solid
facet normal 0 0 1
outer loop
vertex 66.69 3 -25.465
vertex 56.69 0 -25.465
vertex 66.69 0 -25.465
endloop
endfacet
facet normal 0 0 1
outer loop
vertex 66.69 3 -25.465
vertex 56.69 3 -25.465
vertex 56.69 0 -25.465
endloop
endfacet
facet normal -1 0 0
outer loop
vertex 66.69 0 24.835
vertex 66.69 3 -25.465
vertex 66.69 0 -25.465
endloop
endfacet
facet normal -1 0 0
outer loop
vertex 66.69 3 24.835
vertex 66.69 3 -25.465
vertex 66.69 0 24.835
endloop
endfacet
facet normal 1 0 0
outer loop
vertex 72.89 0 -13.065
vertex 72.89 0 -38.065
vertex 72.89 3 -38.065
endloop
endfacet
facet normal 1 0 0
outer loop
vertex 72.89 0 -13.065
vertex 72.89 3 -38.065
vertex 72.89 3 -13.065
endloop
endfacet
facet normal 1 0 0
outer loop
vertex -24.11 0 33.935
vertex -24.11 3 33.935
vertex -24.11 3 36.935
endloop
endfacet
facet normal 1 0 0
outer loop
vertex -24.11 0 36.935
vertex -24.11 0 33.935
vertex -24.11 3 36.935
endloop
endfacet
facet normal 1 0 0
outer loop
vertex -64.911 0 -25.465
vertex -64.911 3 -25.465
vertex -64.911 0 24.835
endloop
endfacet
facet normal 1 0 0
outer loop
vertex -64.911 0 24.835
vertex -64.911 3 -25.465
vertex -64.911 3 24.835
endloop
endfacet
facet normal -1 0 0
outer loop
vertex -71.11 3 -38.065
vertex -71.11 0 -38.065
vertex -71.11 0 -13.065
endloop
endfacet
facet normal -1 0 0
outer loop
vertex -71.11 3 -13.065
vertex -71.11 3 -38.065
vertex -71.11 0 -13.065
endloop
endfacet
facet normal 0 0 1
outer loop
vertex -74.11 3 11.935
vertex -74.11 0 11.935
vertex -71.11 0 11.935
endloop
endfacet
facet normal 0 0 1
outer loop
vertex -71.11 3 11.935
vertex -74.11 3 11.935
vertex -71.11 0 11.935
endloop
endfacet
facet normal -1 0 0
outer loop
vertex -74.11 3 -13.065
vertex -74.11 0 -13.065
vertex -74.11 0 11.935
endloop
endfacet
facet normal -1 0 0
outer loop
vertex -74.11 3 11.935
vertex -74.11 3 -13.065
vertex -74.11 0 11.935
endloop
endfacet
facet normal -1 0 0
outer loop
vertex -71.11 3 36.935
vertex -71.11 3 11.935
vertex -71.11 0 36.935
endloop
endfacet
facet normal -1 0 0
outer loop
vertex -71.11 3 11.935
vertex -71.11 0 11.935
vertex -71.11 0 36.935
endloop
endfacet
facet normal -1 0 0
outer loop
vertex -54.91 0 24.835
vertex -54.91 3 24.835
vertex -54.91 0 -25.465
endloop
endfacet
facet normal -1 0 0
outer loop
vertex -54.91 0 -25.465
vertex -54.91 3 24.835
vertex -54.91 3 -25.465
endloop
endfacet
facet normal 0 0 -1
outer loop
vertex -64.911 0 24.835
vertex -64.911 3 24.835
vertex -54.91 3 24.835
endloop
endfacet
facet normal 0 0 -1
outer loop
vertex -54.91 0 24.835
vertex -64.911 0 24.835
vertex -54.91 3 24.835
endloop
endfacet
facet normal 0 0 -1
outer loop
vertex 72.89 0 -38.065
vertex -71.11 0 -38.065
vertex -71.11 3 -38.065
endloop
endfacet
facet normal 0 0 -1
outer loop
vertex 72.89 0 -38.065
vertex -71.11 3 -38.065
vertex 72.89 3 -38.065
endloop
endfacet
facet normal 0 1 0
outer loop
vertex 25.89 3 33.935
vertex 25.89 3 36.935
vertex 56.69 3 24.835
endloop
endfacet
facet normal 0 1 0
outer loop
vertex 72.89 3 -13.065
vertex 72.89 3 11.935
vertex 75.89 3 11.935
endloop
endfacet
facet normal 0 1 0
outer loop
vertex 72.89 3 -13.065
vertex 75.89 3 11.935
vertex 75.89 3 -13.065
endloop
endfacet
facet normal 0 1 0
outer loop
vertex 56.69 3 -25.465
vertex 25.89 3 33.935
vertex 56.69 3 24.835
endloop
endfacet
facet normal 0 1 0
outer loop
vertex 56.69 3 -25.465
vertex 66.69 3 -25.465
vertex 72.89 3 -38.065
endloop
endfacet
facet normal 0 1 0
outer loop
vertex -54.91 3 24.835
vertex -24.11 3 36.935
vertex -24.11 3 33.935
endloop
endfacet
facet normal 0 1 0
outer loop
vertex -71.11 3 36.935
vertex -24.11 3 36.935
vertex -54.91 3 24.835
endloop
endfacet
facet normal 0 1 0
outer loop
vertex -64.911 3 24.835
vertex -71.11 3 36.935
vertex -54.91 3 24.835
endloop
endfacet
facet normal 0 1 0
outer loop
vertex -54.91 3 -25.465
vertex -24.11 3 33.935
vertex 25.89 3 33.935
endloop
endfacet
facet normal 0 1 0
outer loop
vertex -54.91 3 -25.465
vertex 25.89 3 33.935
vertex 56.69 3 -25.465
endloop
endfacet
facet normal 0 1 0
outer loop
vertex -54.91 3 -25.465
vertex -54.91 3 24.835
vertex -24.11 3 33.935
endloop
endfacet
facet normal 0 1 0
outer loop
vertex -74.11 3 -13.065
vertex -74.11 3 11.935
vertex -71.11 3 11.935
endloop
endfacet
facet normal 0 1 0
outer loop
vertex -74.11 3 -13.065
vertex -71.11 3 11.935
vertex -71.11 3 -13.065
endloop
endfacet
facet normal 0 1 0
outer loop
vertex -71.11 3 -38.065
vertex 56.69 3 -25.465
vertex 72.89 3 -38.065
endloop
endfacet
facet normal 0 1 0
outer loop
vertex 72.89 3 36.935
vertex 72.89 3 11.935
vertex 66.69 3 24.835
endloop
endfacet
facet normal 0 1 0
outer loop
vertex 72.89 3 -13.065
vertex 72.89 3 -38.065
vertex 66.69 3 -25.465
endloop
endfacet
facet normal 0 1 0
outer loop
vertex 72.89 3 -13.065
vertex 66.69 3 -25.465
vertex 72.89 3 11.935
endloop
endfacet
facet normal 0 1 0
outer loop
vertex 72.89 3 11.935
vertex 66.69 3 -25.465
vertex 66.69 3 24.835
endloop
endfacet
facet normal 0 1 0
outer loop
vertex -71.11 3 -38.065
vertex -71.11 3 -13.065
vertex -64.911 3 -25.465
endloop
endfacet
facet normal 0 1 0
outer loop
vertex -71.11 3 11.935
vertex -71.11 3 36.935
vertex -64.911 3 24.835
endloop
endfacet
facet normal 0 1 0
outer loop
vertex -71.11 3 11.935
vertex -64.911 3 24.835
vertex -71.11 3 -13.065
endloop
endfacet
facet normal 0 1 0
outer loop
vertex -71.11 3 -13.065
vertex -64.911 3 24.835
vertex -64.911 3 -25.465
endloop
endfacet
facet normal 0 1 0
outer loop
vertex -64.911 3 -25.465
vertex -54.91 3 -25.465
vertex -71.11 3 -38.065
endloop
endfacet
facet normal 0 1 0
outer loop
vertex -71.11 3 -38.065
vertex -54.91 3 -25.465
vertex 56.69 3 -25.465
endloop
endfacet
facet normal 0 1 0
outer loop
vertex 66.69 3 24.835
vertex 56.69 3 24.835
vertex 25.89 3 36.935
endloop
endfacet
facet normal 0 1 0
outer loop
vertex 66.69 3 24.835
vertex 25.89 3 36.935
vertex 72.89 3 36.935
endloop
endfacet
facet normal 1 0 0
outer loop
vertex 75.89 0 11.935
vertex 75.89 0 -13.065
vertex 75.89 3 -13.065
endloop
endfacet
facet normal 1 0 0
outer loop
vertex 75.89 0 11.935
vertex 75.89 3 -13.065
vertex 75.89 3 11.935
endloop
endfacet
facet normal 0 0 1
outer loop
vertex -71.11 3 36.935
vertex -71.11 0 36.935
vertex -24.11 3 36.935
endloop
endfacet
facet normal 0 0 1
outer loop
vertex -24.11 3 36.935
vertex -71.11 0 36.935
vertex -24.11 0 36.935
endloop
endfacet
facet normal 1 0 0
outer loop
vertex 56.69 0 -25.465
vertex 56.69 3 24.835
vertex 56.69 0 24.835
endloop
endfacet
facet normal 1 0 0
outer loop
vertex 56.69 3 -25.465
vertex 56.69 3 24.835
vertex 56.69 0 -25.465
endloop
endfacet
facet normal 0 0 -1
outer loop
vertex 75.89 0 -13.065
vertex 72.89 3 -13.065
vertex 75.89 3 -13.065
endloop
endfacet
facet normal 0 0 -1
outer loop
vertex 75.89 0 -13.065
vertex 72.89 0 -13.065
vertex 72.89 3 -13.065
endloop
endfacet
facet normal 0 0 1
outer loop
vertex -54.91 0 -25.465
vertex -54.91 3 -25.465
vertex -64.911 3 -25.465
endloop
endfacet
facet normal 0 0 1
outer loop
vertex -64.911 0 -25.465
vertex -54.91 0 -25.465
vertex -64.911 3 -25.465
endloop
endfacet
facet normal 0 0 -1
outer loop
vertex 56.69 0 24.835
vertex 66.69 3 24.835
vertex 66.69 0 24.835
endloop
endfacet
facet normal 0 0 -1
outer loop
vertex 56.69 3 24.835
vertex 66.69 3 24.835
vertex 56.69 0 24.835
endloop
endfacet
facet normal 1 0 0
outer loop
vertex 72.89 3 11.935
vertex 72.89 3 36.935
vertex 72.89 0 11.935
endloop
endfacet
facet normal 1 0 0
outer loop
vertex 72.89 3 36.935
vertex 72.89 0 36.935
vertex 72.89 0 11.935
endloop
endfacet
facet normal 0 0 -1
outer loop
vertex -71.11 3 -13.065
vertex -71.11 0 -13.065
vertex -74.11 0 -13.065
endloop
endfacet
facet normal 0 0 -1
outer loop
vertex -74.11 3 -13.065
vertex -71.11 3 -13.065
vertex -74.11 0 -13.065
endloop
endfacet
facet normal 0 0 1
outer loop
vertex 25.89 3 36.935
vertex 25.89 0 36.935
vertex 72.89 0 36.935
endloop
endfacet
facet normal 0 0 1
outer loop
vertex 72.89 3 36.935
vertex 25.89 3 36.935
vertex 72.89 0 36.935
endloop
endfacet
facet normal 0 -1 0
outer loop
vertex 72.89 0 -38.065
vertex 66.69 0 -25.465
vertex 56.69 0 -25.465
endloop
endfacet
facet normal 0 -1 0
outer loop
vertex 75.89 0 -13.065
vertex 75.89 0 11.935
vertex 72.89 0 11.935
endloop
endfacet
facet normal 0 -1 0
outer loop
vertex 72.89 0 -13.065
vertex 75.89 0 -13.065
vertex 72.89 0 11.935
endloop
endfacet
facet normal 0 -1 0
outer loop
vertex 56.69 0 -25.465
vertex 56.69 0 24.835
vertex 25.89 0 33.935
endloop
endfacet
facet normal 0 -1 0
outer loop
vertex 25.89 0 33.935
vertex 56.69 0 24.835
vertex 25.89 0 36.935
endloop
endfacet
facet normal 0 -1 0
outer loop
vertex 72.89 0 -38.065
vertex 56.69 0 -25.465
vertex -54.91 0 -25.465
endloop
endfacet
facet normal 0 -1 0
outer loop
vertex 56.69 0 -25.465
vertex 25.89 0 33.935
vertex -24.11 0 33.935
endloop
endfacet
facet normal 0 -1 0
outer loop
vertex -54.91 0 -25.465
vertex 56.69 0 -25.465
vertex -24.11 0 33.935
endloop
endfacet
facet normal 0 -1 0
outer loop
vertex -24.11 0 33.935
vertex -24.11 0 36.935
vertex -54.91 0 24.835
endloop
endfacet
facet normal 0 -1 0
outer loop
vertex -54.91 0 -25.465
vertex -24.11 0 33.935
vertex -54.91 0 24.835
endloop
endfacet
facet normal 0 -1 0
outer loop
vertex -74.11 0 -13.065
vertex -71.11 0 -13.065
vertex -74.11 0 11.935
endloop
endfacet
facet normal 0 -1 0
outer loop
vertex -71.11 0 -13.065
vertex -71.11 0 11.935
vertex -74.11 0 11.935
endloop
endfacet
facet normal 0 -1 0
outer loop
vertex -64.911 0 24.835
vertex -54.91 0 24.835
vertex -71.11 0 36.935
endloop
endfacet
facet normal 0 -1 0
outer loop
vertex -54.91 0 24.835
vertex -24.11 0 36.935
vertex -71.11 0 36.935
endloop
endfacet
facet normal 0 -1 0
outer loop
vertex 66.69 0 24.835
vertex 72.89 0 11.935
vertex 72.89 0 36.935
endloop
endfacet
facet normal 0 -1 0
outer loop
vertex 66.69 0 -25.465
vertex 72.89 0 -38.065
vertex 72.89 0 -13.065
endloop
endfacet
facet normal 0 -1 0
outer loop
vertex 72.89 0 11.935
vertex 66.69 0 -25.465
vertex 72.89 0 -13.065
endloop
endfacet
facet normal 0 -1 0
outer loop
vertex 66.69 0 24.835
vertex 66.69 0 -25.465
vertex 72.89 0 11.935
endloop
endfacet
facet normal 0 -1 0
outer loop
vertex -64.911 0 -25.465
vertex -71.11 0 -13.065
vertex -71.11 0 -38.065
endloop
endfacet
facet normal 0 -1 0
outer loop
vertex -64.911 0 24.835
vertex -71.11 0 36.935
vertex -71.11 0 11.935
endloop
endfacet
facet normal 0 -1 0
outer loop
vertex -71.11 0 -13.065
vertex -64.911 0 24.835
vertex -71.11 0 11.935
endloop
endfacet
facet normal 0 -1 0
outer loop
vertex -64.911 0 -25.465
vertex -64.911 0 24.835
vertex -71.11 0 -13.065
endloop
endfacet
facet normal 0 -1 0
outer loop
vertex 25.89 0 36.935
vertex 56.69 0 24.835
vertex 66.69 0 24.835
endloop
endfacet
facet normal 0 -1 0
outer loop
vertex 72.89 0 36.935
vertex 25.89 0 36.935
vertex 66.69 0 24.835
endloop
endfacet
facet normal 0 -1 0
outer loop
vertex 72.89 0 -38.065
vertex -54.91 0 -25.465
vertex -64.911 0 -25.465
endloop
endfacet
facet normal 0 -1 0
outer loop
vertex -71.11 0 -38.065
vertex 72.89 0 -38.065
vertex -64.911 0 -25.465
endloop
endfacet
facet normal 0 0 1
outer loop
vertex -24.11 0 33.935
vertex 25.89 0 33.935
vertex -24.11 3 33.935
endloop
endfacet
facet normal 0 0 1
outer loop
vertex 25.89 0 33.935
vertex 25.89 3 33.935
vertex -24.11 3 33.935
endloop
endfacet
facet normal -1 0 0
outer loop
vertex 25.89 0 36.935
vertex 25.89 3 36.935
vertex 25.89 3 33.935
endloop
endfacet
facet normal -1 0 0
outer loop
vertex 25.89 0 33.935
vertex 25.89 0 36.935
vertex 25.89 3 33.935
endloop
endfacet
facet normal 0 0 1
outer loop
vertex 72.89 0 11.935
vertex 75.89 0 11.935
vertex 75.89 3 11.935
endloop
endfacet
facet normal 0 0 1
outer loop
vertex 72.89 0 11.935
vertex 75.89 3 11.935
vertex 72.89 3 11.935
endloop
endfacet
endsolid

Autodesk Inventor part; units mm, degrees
ref_plane "YZ Plane" through (0, 0, 0) normal (1, 0, 0) x (0, 1, 0)
ref_plane "XZ Plane" through (0, 0, 0) normal (0, 1, 0) x (-1, 0, 0)
ref_plane "XY Plane" through (0, 0, 0) normal (0, 0, 1) x (1, 0, 0)
sketch "Sketch1" plane through (0, 0, 0) normal (0, 1, 0) x (-1, 0, 0)
  line L0 (71.1097, -38.0648) -> (71.1097, -13.0648)
  line L1 (71.1097, -13.0648) -> (74.1097, -13.0648)
  line L2 (74.1097, -13.0648) -> (74.1097, 11.9352)
  line L3 (74.1097, 11.9352) -> (71.1097, 11.9352)
  line L4 (71.1097, 11.9352) -> (71.1097, 36.9352)
  line L5 (-72.8903, -38.0648) -> (-72.8903, -13.0648)
  line L6 (-72.8903, 36.9352) -> (-72.8903, 11.9352)
  line L7 (-72.8903, -13.0648) -> (-75.8903, -13.0648)
  line L8 (-75.8903, -13.0648) -> (-75.8903, 11.9352)
  line L9 (-75.8903, 11.9352) -> (-72.8903, 11.9352)
  line L10 (71.1097, -38.0648) -> (-72.8903, -38.0648)
  line L11 (71.1097, 36.9352) -> (-72.8903, 36.9352)
  point P0 (0, 0)
extrude "Extrusion1" add sketch "Sketch1" along normal blind 3
sketch "Sketch2" plane through (0, 3, 0) normal (0, 1, 0) x (1, 0, 0)
  line L0 (-74.1097, 13.0648) -> (-74.1097, -11.9352) projected
  line L1 (75.8903, -11.9352) -> (75.8903, 13.0648) projected
  line L2 (-71.1097, -36.9352) -> (72.8903, -36.9352) projected
  line L3 (-24.1097, -36.9352) -> (25.8903, -36.9352)
  line L4 (25.8903, -36.9352) -> (25.8903, -33.9352)
  line L5 (25.8903, -33.9352) -> (-24.1097, -33.9352)
  line L6 (-24.1097, -33.9352) -> (-24.1097, -36.9352)
  line L7 (72.8903, 38.0648) -> (-71.1097, 38.0648) projected
  point P0 (0, 0)
  dimension "d13" = 50
  dimension "d14" = 3
extrude "Extrusion2" cut sketch "Sketch2" against normal blind 30
sketch "Sketch3" plane through (0, 3, 0) normal (0, 1, 0) x (1, 0, 0)
  line L0 (-71.1097, -36.9352) -> (-24.1097, -36.9352) projected
  line L1 (-74.1097, 13.0648) -> (-74.1097, -11.9352) projected
  line L2 (-54.9097, 25.4648) -> (-64.9114, 25.4648)
  line L3 (-64.9114, 25.4648) -> (-64.9114, -24.8352)
  line L4 (-64.9114, -24.8352) -> (-54.9097, -24.8352)
  line L5 (-54.9097, -24.8352) -> (-54.9097, 25.4648)
  line L6 (56.6903, 25.4648) -> (66.6903, 25.4648)
  line L7 (66.6903, 25.4648) -> (66.6903, -24.8352)
  line L8 (66.6903, -24.8352) -> (56.6903, -24.8352)
  line L9 (56.6903, -24.8352) -> (56.6903, 25.4648)
  circle A0 centre (-34.6697, 22.9248) radius 2
  circle A1 centre (-35.9397, -22.2952) radius 2
  circle A2 centre (40.2603, 22.9248) radius 2
  circle A3 centre (46.6103, -22.2952) radius 2
  line L10 (-49.9097, 28.4648) -> (51.6903, 28.4648)
  line L11 (51.6903, 28.4648) -> (51.6903, 33.4648)
  line L12 (51.6903, 33.4648) -> (-49.9097, 33.4648)
  line L13 (-49.9097, 33.4648) -> (-49.9097, 28.4648)
  point P0 (0, 0)
  dimension "d32" = 4
  dimension "d35" = 4
  dimension "d38" = 4
  dimension "d39" = 4
extrude "Extrusion3" cut sketch "Sketch3" against normal blind 10
sketch "Sketch4" plane through (0, 3, 0) normal (0, 1, 0) x (1, 0, 0)
  circle A0 centre (-34.6697, 22.9248) radius 2 projected
  circle A1 centre (-34.6697, 22.9248) radius 2
  circle A2 centre (40.2603, 22.9248) radius 2 projected
  circle A3 centre (40.2603, 22.9248) radius 2
  circle A4 centre (46.6103, -22.2952) radius 2 projected
  circle A5 centre (46.6103, -22.2952) radius 2
  circle A6 centre (-35.9397, -22.2952) radius 2 projected
  circle A7 centre (-35.9397, -22.2952) radius 2
  point P0 (0, 0)
extrude "Extrusion4" add sketch "Sketch4" against normal blind 3
sketch "Sketch5" plane through (-49.9097, 3, -28.4648) normal (1, 0, 0) x (0, 0, -1)
  line L0 (0, 0) -> (5, 0) projected
  line L1 (0, 0) -> (5, 0)
  line L2 (5, 0) -> (5, -3)
  line L3 (5, -3) -> (0, -3)
  line L4 (0, -3) -> (0, 0)
  point P0 (-28.4648, -3)
extrude "Extrusion5" add sketch "Sketch5" along normal blind 102.075
properties part number "Level2 (Arduino)"
